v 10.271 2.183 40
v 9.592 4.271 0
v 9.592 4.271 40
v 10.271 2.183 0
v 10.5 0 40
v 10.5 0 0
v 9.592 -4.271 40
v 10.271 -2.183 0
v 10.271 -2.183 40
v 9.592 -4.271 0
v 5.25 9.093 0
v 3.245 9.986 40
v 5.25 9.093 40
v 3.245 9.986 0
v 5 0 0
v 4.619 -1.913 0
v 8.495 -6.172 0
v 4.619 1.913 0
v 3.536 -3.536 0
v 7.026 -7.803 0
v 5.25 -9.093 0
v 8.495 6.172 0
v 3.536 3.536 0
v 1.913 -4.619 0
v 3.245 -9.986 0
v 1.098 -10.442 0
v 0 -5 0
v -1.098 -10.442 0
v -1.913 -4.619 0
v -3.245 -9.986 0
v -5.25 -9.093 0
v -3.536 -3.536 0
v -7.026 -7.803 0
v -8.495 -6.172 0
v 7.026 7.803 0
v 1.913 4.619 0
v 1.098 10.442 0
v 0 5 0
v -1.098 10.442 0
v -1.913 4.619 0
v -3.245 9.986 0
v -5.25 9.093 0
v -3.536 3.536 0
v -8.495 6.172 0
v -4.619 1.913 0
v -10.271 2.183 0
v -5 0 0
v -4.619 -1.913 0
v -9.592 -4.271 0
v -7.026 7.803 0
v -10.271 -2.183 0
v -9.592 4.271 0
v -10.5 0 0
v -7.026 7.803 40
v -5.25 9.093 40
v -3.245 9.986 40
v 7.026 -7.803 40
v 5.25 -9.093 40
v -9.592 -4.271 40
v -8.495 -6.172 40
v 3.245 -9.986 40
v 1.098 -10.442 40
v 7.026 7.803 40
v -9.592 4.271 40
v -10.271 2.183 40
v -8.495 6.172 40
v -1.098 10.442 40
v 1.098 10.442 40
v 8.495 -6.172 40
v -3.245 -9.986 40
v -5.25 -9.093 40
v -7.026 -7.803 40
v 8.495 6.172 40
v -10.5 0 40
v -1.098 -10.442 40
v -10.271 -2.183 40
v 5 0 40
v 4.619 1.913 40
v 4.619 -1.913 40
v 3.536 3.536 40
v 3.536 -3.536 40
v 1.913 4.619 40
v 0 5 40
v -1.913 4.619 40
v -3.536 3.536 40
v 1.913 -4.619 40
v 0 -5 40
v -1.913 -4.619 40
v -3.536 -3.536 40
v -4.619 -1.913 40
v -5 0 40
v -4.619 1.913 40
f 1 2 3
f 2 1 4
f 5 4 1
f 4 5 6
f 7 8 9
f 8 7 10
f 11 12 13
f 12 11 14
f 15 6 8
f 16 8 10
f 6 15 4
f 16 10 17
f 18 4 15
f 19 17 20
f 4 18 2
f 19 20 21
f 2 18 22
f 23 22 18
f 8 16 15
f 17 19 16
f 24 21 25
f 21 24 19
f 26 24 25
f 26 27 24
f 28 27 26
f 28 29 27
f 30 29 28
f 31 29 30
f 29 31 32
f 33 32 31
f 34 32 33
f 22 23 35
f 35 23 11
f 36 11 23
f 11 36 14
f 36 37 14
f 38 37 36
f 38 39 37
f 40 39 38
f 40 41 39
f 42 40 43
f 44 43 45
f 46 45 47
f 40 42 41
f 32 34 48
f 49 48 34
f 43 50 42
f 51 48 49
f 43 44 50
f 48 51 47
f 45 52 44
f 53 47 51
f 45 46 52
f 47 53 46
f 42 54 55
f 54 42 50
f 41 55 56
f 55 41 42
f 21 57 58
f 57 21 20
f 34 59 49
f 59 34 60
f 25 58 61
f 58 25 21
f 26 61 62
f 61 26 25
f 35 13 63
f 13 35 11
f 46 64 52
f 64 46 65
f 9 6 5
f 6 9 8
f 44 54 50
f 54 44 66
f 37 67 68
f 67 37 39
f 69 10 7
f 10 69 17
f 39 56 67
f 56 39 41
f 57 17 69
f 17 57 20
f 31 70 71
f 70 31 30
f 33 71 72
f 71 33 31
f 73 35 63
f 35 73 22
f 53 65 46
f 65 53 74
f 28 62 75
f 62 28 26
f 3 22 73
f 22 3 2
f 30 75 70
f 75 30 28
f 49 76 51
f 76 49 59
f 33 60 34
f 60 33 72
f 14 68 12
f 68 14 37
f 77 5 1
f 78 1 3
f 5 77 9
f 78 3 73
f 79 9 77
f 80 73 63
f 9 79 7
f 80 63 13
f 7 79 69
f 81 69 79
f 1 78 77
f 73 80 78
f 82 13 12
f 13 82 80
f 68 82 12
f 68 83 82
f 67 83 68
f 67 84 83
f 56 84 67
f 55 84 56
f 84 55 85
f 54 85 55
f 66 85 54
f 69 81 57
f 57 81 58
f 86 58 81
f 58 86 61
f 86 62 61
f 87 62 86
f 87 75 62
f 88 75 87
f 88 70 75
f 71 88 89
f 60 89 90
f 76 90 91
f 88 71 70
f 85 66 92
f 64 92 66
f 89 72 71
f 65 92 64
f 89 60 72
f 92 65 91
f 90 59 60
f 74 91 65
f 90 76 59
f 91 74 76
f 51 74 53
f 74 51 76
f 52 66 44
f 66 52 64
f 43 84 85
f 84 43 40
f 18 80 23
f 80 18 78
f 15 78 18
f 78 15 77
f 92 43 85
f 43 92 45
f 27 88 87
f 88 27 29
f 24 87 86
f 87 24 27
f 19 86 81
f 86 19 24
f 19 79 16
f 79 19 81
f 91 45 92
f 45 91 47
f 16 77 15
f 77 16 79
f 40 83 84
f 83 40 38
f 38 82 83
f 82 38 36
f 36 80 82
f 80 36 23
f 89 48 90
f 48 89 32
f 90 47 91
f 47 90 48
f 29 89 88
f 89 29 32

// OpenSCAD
// file: parameters.scad
//Main tube diameter [mm]
main_tube_outer_diameter = 25;
main_tube_inner_diameter = 21;

//Tube for undercarriage [mm]
tube_for_undercarriage_outer_diameter = 10;
tube_for_undercarriage_inner_diameter = 5;

//Screw diameter in model 666_1019 [mm]
M4_screw_diameter=4;
// main file
include <./parameters.scad>
height = 40;

difference (){

cylinder (h = height, r1 = main_tube_inner_diameter/2, r2 = main_tube_inner_diameter/2);
cylinder (h= height, r1 = tube_for_undercarriage_outer_diameter/2, r2 = tube_for_undercarriage_outer_diameter/2);

}
